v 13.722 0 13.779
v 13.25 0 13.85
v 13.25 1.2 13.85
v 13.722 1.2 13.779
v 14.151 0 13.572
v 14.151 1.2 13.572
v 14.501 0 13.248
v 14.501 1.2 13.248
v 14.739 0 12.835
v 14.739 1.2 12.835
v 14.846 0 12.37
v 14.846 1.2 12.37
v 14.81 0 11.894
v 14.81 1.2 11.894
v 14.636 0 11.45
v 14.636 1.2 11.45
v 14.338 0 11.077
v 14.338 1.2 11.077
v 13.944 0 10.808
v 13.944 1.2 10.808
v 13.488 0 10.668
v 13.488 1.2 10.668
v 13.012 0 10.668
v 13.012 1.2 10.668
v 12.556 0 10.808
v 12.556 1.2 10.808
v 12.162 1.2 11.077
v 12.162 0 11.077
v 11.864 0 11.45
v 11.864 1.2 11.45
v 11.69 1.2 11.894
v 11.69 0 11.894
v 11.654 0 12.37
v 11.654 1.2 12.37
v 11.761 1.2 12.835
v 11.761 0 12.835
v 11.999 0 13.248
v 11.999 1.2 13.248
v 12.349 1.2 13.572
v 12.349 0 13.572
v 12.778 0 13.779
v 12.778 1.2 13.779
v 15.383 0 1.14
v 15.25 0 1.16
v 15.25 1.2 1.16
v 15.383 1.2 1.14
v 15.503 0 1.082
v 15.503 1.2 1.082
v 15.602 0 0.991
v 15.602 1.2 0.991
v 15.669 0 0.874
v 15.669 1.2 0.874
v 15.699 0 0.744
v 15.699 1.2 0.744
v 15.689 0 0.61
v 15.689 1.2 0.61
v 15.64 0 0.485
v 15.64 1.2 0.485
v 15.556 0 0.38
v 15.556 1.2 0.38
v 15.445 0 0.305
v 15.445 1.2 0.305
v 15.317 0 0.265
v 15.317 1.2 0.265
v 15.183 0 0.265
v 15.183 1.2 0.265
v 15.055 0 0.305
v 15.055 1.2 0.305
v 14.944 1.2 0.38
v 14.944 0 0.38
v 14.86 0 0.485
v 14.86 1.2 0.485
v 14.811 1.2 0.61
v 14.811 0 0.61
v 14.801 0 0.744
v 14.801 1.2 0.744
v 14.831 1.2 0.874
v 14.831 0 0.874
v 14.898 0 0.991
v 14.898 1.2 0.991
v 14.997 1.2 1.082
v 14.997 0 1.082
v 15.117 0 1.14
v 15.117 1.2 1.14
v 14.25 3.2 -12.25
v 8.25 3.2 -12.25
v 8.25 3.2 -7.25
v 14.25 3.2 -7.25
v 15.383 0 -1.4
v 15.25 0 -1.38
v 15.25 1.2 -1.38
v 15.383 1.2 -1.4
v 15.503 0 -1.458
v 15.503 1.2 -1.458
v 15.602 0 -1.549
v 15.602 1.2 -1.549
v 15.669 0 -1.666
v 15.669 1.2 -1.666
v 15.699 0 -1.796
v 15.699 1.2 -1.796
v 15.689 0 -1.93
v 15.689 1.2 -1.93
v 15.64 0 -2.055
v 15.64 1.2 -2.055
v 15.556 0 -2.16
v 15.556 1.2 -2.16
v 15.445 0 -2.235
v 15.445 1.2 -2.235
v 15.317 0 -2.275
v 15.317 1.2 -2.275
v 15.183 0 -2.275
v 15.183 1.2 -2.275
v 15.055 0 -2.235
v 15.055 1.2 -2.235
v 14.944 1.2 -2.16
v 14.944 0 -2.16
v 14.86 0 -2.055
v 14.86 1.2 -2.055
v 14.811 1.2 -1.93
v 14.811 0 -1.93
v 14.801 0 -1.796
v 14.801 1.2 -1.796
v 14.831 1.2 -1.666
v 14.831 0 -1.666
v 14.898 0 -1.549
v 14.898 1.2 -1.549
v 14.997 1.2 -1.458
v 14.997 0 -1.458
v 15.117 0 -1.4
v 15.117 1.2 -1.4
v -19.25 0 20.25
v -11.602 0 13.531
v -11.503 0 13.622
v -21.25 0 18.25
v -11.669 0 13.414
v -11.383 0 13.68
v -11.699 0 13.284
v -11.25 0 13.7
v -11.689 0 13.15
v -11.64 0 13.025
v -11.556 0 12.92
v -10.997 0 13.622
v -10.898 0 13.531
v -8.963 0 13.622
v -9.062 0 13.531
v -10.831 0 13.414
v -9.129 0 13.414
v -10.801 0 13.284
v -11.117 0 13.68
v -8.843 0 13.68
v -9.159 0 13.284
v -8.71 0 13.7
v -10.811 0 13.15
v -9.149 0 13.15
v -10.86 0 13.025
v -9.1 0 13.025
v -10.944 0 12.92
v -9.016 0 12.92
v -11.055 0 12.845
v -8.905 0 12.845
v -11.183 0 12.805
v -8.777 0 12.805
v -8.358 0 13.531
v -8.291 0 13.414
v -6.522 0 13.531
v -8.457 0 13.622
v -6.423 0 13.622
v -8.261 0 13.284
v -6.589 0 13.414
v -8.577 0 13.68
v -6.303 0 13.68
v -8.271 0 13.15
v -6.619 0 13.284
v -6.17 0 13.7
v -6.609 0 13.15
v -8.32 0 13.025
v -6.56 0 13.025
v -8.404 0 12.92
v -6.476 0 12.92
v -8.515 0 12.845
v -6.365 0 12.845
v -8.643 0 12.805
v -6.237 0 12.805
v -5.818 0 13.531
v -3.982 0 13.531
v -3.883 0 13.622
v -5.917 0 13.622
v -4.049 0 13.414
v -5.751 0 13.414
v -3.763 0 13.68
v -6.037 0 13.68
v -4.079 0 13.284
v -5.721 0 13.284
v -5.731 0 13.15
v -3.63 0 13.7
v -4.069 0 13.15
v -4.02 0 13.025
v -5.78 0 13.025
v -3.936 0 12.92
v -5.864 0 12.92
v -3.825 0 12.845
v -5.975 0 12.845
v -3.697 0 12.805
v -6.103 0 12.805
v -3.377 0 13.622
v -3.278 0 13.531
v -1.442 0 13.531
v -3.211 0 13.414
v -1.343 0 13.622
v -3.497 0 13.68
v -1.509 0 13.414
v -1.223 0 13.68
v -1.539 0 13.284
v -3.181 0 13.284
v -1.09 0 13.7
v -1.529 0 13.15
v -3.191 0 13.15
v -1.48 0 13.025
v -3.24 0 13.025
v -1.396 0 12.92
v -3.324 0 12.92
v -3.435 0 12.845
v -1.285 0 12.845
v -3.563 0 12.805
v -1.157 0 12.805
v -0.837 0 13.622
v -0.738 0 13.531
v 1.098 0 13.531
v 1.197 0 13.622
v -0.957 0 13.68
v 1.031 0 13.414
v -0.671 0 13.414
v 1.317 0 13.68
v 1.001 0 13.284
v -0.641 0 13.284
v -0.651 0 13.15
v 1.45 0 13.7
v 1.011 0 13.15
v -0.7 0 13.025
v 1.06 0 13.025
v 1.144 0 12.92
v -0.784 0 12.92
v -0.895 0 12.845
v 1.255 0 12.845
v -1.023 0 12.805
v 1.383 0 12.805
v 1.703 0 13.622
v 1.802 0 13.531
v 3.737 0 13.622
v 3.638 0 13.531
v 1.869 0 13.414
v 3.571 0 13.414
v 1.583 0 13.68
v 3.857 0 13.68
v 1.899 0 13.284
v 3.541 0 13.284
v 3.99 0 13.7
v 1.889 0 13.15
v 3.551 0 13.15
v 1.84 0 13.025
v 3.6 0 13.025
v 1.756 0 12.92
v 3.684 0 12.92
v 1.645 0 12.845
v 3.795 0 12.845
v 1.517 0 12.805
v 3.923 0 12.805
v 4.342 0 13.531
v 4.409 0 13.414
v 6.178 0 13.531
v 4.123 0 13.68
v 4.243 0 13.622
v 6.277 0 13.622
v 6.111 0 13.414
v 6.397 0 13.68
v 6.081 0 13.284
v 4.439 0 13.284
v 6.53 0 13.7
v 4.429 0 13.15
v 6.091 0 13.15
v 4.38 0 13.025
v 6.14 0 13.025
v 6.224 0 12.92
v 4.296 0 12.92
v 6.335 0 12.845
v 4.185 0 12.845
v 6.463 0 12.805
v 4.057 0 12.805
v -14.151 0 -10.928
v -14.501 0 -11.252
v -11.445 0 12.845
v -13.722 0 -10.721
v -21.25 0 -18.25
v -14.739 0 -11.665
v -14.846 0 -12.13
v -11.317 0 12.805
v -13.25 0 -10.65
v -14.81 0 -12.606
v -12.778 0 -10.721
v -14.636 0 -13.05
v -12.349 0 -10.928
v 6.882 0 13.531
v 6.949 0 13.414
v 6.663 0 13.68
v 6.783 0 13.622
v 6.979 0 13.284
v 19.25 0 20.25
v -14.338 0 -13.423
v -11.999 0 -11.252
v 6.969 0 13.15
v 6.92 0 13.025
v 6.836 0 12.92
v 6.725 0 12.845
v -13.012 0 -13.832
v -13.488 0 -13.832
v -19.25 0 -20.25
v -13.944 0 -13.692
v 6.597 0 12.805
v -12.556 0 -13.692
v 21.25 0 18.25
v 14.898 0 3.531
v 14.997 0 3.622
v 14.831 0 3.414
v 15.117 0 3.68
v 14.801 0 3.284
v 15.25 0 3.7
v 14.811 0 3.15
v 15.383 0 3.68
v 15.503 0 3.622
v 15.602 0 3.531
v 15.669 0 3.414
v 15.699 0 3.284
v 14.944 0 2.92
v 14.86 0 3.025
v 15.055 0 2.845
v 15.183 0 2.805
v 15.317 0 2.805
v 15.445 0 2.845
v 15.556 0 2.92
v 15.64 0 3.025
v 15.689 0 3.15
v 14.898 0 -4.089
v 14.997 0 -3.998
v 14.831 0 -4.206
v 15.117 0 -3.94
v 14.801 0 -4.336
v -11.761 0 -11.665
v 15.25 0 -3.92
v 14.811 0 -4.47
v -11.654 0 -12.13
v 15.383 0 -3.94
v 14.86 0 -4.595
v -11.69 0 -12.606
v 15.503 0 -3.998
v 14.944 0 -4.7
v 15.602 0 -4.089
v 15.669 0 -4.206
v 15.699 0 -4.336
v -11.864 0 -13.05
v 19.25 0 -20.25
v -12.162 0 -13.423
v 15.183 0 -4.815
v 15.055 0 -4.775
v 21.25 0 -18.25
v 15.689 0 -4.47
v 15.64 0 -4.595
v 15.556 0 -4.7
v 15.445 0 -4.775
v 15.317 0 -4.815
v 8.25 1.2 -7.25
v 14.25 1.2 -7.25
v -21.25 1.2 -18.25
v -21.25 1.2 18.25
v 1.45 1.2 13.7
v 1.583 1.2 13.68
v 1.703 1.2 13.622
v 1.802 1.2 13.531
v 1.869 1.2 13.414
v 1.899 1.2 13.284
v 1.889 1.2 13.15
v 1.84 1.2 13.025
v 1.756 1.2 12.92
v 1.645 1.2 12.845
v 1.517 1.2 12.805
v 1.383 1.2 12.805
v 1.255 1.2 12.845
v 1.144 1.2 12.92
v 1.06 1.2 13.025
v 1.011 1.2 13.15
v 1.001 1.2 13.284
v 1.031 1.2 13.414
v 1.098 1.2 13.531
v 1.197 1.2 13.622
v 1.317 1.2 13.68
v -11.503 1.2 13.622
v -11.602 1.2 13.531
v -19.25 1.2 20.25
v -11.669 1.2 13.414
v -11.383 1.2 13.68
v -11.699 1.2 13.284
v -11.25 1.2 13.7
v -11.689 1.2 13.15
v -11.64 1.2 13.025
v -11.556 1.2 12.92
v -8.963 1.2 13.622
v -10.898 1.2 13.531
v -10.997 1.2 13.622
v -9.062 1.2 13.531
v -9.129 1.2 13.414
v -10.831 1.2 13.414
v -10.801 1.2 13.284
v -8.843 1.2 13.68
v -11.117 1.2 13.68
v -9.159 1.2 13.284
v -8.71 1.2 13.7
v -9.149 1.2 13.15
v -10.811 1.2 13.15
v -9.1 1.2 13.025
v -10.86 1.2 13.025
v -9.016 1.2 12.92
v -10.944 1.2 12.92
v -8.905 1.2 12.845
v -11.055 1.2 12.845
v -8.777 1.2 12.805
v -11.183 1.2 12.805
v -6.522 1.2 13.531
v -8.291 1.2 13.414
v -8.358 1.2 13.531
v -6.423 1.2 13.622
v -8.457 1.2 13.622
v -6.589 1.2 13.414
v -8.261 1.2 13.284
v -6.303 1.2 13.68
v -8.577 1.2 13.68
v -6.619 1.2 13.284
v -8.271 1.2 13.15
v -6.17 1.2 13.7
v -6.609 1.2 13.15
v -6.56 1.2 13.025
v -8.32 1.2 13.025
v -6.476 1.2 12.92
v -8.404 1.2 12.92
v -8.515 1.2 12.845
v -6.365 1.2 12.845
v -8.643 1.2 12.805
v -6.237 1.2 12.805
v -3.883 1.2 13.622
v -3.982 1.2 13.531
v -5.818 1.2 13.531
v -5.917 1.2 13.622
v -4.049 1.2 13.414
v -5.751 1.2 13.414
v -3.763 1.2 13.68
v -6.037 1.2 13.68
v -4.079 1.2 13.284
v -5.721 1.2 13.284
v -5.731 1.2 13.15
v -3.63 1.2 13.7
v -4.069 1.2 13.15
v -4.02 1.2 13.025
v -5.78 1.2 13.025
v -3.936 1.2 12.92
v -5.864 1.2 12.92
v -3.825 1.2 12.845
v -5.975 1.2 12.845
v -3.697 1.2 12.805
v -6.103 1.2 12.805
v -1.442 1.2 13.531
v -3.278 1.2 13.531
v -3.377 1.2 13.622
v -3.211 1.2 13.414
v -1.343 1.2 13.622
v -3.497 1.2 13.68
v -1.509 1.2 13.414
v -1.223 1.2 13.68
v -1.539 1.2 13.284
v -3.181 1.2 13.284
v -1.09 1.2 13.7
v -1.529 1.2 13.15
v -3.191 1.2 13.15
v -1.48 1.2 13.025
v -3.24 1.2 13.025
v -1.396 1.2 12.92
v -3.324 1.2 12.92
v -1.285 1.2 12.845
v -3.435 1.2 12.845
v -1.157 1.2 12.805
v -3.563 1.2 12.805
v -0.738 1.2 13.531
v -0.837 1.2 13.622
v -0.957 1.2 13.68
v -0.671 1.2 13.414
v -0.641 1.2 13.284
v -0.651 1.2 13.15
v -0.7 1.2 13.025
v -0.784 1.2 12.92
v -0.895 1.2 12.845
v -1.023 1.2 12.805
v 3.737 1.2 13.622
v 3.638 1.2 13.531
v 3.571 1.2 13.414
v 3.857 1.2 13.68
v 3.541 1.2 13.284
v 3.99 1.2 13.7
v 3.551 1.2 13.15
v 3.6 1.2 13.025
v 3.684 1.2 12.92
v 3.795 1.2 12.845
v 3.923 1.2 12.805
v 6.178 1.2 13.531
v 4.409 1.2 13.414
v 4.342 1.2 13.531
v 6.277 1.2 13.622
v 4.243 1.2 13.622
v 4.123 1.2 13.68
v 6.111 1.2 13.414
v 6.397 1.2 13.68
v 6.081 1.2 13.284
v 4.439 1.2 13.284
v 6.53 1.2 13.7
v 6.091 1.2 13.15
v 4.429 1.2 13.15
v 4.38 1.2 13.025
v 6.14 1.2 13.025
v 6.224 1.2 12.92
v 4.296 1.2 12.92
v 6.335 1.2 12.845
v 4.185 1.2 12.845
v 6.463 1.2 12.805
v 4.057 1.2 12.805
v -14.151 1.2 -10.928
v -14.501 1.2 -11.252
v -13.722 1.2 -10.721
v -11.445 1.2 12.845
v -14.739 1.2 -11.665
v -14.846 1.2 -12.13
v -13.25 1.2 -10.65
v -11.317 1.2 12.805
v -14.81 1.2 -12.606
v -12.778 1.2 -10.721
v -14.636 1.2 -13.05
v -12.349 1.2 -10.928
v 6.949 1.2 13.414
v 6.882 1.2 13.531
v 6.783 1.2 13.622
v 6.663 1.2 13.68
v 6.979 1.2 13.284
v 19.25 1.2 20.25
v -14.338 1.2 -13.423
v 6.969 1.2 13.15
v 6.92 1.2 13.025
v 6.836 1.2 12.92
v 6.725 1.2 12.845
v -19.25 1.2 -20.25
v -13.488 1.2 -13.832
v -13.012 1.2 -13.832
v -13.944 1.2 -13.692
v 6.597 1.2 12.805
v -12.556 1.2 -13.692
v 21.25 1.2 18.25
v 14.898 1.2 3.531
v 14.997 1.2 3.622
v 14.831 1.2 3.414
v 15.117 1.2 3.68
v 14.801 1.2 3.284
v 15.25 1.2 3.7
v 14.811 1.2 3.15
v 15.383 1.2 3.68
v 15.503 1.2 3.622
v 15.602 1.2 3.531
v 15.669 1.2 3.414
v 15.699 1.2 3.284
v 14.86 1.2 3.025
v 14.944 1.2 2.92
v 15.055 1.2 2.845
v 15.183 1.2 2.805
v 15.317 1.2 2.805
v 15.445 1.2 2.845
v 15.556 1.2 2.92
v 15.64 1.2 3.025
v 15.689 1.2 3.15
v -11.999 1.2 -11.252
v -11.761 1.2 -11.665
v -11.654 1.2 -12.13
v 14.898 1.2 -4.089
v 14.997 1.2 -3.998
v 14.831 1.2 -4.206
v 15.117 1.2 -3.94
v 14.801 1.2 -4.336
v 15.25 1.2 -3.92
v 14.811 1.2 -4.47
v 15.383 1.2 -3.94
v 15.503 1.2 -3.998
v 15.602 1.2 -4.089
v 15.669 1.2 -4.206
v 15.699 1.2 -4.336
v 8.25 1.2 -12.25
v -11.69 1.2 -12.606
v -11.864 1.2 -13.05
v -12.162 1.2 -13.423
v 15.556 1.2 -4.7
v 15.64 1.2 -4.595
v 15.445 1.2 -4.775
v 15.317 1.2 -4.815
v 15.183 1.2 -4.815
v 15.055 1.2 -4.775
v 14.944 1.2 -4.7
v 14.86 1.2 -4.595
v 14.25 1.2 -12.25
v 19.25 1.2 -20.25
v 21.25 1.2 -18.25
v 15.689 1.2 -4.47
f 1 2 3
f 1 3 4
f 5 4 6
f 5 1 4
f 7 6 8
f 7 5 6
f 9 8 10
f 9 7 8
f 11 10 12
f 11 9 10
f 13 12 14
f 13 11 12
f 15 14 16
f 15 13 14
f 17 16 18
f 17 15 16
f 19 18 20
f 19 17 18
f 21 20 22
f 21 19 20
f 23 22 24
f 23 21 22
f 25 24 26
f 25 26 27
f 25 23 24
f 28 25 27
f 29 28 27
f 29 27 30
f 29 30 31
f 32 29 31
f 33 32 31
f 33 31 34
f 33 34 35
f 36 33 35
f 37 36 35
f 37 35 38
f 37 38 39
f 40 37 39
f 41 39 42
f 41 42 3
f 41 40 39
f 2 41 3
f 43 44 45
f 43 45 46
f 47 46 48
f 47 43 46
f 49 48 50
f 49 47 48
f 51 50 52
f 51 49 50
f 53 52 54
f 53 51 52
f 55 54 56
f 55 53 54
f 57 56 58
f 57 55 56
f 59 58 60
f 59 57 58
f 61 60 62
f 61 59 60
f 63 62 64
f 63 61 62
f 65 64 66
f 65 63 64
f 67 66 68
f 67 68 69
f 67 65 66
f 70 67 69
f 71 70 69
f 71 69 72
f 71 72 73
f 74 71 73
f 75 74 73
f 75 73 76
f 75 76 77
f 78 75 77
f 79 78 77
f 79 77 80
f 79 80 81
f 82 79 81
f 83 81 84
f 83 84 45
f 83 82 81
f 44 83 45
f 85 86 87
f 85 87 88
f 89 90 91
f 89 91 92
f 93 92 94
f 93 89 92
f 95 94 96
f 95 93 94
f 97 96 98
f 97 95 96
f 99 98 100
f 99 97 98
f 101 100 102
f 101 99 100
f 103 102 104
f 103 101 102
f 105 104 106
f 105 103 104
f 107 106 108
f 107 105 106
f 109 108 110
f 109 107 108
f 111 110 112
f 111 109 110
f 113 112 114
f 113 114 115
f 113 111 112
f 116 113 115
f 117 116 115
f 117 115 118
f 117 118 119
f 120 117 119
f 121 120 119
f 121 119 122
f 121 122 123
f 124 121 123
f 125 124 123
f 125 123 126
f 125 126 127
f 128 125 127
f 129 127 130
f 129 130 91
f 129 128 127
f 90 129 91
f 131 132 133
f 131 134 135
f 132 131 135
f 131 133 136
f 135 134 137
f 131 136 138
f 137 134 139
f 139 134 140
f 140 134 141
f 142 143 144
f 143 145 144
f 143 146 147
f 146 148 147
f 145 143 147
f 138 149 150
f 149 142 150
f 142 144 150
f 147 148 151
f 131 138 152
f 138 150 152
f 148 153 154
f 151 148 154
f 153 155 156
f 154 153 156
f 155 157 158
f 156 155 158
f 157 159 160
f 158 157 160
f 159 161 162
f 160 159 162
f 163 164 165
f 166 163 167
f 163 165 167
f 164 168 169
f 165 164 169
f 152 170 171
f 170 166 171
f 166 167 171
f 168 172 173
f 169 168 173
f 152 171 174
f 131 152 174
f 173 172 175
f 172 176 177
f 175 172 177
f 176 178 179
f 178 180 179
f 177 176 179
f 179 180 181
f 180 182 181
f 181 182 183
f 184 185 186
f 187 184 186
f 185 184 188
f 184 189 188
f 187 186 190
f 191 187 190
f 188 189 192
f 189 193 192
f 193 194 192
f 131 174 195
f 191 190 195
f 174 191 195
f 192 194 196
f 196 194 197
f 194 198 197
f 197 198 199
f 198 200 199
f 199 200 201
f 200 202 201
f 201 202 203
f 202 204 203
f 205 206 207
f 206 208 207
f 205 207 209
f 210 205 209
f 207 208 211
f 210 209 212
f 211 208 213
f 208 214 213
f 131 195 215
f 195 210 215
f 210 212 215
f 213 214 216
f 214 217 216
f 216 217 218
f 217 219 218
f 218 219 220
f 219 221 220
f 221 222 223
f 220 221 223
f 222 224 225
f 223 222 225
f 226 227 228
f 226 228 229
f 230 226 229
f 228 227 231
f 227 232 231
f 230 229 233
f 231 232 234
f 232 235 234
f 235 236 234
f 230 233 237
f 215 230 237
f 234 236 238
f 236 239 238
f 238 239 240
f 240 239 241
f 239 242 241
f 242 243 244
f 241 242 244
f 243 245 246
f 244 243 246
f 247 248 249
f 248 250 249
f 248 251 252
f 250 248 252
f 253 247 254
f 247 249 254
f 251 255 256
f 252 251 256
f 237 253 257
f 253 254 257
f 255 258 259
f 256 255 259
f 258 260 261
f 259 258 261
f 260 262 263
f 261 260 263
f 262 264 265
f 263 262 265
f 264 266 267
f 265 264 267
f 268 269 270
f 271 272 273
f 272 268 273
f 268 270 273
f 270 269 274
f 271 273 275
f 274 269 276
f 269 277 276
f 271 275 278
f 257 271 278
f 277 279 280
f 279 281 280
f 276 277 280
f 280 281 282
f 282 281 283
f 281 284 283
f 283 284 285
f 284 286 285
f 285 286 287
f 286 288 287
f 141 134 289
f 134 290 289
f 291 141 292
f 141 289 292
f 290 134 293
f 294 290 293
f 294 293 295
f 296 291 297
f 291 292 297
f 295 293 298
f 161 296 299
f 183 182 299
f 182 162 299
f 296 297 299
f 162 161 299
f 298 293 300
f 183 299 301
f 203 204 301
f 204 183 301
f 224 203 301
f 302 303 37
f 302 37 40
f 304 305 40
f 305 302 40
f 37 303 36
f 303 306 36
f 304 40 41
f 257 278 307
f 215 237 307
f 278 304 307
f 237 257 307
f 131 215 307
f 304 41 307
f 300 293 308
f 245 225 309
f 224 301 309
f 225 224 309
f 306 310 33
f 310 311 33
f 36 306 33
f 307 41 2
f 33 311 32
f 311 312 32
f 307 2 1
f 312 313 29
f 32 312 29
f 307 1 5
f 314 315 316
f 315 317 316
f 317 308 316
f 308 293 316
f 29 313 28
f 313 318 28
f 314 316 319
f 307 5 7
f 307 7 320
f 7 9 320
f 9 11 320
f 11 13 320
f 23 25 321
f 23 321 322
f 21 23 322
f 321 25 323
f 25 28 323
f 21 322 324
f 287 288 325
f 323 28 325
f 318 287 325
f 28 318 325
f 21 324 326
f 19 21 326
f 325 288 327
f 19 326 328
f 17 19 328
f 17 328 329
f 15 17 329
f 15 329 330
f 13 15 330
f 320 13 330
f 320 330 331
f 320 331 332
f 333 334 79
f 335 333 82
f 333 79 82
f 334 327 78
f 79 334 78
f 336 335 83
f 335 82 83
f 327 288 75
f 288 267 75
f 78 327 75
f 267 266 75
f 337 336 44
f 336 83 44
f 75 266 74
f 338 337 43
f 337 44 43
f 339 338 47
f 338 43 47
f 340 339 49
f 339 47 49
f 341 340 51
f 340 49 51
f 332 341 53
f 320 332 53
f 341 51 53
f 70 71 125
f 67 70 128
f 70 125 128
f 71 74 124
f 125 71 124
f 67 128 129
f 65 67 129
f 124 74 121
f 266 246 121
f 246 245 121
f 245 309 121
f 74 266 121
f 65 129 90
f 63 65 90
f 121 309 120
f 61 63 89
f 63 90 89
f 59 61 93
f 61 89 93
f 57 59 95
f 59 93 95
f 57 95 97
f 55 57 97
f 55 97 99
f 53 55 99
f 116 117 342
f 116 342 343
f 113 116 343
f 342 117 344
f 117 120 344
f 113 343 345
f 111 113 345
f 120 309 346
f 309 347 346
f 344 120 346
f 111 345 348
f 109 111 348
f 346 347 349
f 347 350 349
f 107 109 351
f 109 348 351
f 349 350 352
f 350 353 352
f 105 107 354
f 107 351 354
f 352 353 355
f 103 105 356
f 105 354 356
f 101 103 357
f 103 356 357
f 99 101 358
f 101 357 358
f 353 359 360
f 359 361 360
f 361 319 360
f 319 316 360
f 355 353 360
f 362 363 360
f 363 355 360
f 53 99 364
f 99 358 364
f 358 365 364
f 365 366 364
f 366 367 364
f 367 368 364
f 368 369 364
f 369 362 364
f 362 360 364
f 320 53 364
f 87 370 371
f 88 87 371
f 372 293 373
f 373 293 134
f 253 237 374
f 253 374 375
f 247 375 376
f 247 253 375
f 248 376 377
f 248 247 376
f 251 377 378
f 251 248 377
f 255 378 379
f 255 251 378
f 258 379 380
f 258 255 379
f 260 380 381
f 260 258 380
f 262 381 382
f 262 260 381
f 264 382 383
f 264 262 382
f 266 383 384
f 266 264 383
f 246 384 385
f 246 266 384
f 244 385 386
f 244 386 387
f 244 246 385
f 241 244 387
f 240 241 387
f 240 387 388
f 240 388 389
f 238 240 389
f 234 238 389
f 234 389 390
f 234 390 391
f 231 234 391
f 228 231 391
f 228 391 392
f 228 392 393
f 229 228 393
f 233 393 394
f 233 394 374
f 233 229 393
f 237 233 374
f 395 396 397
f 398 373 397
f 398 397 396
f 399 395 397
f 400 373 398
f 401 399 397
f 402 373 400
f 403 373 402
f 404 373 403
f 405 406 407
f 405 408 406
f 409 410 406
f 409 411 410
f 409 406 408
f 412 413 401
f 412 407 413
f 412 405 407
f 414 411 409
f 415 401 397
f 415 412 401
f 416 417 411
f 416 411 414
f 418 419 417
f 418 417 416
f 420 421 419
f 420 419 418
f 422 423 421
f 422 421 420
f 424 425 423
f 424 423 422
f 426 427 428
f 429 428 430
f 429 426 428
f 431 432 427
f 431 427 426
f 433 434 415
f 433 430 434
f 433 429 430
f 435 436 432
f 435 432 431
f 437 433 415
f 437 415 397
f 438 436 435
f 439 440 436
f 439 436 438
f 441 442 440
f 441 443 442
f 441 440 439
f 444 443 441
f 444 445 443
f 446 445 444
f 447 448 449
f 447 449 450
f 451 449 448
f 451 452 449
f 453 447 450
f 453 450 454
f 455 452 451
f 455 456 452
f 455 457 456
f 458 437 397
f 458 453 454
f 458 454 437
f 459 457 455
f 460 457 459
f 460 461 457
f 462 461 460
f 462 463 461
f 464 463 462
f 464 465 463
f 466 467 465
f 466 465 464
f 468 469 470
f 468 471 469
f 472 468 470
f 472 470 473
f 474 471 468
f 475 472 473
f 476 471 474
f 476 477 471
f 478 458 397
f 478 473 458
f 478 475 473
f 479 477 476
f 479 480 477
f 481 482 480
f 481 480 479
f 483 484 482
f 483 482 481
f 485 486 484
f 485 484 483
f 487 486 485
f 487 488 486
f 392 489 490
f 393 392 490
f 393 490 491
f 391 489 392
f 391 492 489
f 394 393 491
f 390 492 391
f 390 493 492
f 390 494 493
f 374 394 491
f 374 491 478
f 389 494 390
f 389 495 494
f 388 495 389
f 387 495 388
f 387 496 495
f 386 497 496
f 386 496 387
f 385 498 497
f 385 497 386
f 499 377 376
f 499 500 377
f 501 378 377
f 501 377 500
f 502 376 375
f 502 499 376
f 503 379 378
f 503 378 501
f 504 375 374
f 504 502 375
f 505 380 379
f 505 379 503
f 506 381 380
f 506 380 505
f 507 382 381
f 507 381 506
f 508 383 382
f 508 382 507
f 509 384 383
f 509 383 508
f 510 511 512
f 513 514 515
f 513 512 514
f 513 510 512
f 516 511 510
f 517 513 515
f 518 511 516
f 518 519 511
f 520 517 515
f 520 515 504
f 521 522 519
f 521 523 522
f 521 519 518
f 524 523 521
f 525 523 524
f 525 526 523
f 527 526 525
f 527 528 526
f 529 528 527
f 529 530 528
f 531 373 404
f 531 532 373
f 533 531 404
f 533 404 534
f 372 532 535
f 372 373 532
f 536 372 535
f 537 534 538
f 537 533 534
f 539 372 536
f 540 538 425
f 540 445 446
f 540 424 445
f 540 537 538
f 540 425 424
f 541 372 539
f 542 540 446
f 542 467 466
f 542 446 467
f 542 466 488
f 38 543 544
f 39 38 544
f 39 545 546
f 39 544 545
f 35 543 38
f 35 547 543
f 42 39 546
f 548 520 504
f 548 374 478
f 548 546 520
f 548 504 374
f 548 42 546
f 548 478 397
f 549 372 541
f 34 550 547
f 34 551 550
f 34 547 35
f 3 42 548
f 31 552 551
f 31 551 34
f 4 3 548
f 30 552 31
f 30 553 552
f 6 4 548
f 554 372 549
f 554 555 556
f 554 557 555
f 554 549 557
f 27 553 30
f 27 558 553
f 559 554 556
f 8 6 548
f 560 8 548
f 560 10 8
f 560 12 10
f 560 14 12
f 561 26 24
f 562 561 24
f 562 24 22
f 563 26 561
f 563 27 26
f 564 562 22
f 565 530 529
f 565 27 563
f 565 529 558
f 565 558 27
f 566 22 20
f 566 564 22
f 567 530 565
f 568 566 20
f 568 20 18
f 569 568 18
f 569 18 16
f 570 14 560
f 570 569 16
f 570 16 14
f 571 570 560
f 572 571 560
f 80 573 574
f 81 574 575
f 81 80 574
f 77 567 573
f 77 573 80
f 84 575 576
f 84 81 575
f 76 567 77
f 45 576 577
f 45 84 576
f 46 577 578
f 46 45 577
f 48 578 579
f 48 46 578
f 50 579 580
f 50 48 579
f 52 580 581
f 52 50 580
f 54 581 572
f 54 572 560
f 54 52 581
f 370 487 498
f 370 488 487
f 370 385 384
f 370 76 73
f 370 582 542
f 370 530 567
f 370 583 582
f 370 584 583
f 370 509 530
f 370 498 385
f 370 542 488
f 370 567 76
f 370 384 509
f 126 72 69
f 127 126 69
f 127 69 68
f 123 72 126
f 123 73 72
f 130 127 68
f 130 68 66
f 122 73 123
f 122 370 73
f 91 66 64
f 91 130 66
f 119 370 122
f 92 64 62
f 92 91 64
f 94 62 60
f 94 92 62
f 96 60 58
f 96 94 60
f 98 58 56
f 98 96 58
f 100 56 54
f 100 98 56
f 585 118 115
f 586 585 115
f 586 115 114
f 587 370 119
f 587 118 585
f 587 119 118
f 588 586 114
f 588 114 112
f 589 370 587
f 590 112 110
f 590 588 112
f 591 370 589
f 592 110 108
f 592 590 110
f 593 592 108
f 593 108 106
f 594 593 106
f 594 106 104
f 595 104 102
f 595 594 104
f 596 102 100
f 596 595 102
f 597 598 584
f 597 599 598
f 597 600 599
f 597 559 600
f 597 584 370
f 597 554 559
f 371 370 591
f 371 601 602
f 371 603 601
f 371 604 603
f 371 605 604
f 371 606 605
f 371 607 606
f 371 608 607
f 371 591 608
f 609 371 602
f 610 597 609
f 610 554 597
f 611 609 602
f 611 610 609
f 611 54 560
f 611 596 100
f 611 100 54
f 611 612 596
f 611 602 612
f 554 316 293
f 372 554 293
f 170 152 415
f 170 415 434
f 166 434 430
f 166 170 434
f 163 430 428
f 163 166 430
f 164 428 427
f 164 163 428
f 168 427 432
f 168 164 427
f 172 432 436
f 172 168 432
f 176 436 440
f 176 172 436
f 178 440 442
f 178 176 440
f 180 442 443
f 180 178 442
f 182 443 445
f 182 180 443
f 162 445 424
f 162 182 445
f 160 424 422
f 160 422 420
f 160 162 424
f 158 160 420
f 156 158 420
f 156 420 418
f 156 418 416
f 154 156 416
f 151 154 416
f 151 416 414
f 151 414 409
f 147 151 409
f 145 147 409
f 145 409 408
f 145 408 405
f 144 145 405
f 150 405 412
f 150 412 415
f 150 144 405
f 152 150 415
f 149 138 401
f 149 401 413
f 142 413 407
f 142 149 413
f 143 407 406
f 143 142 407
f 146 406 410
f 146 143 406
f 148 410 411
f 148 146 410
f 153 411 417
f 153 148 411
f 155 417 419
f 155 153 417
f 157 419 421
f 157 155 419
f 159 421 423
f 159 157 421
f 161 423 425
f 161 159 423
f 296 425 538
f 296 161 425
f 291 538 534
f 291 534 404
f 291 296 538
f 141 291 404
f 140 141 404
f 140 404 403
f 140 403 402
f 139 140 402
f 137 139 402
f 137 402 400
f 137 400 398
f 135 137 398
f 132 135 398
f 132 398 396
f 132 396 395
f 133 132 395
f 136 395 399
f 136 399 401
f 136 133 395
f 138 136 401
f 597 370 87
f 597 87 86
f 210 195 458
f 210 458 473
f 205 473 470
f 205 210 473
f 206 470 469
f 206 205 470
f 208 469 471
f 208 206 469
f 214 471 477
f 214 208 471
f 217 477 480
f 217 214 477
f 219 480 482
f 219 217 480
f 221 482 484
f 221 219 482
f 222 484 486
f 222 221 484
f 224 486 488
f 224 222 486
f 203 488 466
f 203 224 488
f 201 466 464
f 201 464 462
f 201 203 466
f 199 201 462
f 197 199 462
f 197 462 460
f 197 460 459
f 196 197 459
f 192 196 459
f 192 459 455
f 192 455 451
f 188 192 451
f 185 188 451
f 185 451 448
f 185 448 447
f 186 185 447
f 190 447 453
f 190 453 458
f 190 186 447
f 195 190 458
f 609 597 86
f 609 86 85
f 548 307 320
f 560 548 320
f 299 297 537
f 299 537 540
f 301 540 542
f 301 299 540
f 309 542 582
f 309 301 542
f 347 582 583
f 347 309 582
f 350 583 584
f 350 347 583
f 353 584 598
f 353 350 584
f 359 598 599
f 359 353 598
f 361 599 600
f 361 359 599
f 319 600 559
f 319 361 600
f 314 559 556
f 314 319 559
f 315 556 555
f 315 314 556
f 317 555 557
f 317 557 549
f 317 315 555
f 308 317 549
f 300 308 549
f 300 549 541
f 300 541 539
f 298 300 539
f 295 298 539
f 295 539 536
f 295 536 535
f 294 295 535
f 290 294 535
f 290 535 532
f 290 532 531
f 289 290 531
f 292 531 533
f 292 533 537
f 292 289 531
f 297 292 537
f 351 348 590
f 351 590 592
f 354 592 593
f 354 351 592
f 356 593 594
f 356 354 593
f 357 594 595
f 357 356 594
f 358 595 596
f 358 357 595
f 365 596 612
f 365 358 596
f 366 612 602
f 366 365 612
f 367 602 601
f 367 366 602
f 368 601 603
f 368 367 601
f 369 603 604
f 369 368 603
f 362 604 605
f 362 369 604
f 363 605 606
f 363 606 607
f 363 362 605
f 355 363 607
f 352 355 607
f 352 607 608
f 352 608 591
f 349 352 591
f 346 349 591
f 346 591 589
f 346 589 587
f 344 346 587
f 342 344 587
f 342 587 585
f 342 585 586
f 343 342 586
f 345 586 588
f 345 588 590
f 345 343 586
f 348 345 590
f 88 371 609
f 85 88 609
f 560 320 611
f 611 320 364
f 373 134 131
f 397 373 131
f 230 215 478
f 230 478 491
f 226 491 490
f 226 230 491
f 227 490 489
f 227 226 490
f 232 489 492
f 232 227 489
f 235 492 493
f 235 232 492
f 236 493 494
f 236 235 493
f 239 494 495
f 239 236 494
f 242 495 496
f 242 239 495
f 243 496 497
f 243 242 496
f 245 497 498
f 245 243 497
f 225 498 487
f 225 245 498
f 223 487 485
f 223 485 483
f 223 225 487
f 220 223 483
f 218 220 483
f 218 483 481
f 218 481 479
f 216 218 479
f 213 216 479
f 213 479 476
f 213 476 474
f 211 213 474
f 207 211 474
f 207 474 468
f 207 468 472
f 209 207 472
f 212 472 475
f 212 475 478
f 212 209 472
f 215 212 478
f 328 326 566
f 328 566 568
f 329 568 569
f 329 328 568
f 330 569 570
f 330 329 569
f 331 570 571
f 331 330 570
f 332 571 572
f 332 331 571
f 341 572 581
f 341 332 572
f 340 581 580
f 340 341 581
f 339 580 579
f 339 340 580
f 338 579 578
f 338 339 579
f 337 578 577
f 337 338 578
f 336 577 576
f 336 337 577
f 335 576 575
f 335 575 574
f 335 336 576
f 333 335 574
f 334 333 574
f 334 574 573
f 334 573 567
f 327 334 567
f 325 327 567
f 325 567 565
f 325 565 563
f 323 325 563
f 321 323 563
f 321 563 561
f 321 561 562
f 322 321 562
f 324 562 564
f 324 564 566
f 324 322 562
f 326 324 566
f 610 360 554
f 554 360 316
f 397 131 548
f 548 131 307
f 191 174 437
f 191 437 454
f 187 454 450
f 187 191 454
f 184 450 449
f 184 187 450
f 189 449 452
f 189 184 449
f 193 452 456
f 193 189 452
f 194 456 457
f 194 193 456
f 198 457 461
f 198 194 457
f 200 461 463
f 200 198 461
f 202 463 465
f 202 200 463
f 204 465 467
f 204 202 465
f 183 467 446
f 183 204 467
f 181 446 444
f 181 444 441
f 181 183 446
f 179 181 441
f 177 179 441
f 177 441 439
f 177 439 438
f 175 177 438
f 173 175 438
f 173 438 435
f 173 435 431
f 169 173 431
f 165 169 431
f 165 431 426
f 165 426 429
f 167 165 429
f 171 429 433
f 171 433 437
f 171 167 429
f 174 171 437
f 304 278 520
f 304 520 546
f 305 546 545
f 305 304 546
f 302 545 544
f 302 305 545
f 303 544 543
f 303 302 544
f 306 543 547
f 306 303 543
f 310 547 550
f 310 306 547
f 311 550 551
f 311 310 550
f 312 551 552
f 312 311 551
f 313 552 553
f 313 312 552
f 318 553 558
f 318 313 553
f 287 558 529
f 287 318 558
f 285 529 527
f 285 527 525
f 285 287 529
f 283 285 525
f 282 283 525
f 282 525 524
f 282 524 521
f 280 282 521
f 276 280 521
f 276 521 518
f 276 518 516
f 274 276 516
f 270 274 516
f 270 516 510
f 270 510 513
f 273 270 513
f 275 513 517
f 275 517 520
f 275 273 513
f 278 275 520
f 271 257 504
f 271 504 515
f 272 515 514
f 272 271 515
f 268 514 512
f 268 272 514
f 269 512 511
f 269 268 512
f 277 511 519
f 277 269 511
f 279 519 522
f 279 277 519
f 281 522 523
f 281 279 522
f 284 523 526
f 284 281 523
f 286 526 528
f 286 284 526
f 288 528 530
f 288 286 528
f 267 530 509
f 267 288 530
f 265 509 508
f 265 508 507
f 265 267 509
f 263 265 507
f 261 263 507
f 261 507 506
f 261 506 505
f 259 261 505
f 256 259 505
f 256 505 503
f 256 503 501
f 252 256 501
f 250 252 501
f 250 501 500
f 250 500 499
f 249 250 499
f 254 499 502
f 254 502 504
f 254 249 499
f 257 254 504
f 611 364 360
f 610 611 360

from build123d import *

# Parameters (mm, degrees)
SKETCH_1_R      = 1.6
SKETCH_1_R_2    = 0.45
EXTRUDE_1_DEPTH = 1.2
SKETCH_3_W      = 6
SKETCH_3_H      = 5
EXTRUDE_2_DEPTH = 2


with BuildPart() as part:
    # 草图1 → 凸台-拉伸1 (new body)
    with BuildSketch(Plane(origin=(0, 0, 0), x_dir=(1, 0, 0), z_dir=(0, 1, 0))):
        Polygon((19.25, -20.25), (21.25, -18.25), (21.25, 18.25), (19.25, 20.25), (-19.25, 20.25), (-21.25, 18.25), (-21.25, -18.25), (-19.25, -20.25), align=None)
        with Locations(Location((13.25, -12.25, 0), (0, 0, 270))):
            Circle(SKETCH_1_R, mode=Mode.SUBTRACT)
        with Locations(Location((-13.25, 12.25, 0), (0, 0, 270))):
            Circle(SKETCH_1_R, mode=Mode.SUBTRACT)
        with Locations(Location((-11.25, -13.25, 0), (0, 0, 270))):
            Circle(SKETCH_1_R_2, mode=Mode.SUBTRACT)
        with Locations(Location((-8.71, -13.25, 0), (0, 0, 270))):
            Circle(SKETCH_1_R_2, mode=Mode.SUBTRACT)
        with Locations(Location((-6.17, -13.25, 0), (0, 0, 270))):
            Circle(SKETCH_1_R_2, mode=Mode.SUBTRACT)
        with Locations(Location((-3.63, -13.25, 0), (0, 0, 270))):
            Circle(SKETCH_1_R_2, mode=Mode.SUBTRACT)
        with Locations(Location((-1.09, -13.25, 0), (0, 0, 270))):
            Circle(SKETCH_1_R_2, mode=Mode.SUBTRACT)
        with Locations(Location((1.45, -13.25, 0), (0, 0, 270))):
            Circle(SKETCH_1_R_2, mode=Mode.SUBTRACT)
        with Locations(Location((3.99, -13.25, 0), (0, 0, 270))):
            Circle(SKETCH_1_R_2, mode=Mode.SUBTRACT)
        with Locations(Location((6.53, -13.25, 0), (0, 0, 270))):
            Circle(SKETCH_1_R_2, mode=Mode.SUBTRACT)
        with Locations(Location((15.25, -3.25, 0), (0, 0, 270))):
            Circle(SKETCH_1_R_2, mode=Mode.SUBTRACT)
        with Locations(Location((15.25, -0.71, 0), (0, 0, 270))):
            Circle(SKETCH_1_R_2, mode=Mode.SUBTRACT)
        with Locations(Location((15.25, 1.83, 0), (0, 0, 270))):
            Circle(SKETCH_1_R_2, mode=Mode.SUBTRACT)
        with Locations(Location((15.25, 4.37, 0), (0, 0, 270))):
            Circle(SKETCH_1_R_2, mode=Mode.SUBTRACT)
    extrude(amount=EXTRUDE_1_DEPTH)

    # 草图3 → 凸台-拉伸2 (add)
    with BuildSketch(Plane(origin=(0, 1.2, 0), x_dir=(1, 0, 0), z_dir=(0, 1, 0))):
        with Locations((11.25, 9.75)):
            Rectangle(SKETCH_3_W, SKETCH_3_H)
    extrude(amount=EXTRUDE_2_DEPTH)


solid = part.part
